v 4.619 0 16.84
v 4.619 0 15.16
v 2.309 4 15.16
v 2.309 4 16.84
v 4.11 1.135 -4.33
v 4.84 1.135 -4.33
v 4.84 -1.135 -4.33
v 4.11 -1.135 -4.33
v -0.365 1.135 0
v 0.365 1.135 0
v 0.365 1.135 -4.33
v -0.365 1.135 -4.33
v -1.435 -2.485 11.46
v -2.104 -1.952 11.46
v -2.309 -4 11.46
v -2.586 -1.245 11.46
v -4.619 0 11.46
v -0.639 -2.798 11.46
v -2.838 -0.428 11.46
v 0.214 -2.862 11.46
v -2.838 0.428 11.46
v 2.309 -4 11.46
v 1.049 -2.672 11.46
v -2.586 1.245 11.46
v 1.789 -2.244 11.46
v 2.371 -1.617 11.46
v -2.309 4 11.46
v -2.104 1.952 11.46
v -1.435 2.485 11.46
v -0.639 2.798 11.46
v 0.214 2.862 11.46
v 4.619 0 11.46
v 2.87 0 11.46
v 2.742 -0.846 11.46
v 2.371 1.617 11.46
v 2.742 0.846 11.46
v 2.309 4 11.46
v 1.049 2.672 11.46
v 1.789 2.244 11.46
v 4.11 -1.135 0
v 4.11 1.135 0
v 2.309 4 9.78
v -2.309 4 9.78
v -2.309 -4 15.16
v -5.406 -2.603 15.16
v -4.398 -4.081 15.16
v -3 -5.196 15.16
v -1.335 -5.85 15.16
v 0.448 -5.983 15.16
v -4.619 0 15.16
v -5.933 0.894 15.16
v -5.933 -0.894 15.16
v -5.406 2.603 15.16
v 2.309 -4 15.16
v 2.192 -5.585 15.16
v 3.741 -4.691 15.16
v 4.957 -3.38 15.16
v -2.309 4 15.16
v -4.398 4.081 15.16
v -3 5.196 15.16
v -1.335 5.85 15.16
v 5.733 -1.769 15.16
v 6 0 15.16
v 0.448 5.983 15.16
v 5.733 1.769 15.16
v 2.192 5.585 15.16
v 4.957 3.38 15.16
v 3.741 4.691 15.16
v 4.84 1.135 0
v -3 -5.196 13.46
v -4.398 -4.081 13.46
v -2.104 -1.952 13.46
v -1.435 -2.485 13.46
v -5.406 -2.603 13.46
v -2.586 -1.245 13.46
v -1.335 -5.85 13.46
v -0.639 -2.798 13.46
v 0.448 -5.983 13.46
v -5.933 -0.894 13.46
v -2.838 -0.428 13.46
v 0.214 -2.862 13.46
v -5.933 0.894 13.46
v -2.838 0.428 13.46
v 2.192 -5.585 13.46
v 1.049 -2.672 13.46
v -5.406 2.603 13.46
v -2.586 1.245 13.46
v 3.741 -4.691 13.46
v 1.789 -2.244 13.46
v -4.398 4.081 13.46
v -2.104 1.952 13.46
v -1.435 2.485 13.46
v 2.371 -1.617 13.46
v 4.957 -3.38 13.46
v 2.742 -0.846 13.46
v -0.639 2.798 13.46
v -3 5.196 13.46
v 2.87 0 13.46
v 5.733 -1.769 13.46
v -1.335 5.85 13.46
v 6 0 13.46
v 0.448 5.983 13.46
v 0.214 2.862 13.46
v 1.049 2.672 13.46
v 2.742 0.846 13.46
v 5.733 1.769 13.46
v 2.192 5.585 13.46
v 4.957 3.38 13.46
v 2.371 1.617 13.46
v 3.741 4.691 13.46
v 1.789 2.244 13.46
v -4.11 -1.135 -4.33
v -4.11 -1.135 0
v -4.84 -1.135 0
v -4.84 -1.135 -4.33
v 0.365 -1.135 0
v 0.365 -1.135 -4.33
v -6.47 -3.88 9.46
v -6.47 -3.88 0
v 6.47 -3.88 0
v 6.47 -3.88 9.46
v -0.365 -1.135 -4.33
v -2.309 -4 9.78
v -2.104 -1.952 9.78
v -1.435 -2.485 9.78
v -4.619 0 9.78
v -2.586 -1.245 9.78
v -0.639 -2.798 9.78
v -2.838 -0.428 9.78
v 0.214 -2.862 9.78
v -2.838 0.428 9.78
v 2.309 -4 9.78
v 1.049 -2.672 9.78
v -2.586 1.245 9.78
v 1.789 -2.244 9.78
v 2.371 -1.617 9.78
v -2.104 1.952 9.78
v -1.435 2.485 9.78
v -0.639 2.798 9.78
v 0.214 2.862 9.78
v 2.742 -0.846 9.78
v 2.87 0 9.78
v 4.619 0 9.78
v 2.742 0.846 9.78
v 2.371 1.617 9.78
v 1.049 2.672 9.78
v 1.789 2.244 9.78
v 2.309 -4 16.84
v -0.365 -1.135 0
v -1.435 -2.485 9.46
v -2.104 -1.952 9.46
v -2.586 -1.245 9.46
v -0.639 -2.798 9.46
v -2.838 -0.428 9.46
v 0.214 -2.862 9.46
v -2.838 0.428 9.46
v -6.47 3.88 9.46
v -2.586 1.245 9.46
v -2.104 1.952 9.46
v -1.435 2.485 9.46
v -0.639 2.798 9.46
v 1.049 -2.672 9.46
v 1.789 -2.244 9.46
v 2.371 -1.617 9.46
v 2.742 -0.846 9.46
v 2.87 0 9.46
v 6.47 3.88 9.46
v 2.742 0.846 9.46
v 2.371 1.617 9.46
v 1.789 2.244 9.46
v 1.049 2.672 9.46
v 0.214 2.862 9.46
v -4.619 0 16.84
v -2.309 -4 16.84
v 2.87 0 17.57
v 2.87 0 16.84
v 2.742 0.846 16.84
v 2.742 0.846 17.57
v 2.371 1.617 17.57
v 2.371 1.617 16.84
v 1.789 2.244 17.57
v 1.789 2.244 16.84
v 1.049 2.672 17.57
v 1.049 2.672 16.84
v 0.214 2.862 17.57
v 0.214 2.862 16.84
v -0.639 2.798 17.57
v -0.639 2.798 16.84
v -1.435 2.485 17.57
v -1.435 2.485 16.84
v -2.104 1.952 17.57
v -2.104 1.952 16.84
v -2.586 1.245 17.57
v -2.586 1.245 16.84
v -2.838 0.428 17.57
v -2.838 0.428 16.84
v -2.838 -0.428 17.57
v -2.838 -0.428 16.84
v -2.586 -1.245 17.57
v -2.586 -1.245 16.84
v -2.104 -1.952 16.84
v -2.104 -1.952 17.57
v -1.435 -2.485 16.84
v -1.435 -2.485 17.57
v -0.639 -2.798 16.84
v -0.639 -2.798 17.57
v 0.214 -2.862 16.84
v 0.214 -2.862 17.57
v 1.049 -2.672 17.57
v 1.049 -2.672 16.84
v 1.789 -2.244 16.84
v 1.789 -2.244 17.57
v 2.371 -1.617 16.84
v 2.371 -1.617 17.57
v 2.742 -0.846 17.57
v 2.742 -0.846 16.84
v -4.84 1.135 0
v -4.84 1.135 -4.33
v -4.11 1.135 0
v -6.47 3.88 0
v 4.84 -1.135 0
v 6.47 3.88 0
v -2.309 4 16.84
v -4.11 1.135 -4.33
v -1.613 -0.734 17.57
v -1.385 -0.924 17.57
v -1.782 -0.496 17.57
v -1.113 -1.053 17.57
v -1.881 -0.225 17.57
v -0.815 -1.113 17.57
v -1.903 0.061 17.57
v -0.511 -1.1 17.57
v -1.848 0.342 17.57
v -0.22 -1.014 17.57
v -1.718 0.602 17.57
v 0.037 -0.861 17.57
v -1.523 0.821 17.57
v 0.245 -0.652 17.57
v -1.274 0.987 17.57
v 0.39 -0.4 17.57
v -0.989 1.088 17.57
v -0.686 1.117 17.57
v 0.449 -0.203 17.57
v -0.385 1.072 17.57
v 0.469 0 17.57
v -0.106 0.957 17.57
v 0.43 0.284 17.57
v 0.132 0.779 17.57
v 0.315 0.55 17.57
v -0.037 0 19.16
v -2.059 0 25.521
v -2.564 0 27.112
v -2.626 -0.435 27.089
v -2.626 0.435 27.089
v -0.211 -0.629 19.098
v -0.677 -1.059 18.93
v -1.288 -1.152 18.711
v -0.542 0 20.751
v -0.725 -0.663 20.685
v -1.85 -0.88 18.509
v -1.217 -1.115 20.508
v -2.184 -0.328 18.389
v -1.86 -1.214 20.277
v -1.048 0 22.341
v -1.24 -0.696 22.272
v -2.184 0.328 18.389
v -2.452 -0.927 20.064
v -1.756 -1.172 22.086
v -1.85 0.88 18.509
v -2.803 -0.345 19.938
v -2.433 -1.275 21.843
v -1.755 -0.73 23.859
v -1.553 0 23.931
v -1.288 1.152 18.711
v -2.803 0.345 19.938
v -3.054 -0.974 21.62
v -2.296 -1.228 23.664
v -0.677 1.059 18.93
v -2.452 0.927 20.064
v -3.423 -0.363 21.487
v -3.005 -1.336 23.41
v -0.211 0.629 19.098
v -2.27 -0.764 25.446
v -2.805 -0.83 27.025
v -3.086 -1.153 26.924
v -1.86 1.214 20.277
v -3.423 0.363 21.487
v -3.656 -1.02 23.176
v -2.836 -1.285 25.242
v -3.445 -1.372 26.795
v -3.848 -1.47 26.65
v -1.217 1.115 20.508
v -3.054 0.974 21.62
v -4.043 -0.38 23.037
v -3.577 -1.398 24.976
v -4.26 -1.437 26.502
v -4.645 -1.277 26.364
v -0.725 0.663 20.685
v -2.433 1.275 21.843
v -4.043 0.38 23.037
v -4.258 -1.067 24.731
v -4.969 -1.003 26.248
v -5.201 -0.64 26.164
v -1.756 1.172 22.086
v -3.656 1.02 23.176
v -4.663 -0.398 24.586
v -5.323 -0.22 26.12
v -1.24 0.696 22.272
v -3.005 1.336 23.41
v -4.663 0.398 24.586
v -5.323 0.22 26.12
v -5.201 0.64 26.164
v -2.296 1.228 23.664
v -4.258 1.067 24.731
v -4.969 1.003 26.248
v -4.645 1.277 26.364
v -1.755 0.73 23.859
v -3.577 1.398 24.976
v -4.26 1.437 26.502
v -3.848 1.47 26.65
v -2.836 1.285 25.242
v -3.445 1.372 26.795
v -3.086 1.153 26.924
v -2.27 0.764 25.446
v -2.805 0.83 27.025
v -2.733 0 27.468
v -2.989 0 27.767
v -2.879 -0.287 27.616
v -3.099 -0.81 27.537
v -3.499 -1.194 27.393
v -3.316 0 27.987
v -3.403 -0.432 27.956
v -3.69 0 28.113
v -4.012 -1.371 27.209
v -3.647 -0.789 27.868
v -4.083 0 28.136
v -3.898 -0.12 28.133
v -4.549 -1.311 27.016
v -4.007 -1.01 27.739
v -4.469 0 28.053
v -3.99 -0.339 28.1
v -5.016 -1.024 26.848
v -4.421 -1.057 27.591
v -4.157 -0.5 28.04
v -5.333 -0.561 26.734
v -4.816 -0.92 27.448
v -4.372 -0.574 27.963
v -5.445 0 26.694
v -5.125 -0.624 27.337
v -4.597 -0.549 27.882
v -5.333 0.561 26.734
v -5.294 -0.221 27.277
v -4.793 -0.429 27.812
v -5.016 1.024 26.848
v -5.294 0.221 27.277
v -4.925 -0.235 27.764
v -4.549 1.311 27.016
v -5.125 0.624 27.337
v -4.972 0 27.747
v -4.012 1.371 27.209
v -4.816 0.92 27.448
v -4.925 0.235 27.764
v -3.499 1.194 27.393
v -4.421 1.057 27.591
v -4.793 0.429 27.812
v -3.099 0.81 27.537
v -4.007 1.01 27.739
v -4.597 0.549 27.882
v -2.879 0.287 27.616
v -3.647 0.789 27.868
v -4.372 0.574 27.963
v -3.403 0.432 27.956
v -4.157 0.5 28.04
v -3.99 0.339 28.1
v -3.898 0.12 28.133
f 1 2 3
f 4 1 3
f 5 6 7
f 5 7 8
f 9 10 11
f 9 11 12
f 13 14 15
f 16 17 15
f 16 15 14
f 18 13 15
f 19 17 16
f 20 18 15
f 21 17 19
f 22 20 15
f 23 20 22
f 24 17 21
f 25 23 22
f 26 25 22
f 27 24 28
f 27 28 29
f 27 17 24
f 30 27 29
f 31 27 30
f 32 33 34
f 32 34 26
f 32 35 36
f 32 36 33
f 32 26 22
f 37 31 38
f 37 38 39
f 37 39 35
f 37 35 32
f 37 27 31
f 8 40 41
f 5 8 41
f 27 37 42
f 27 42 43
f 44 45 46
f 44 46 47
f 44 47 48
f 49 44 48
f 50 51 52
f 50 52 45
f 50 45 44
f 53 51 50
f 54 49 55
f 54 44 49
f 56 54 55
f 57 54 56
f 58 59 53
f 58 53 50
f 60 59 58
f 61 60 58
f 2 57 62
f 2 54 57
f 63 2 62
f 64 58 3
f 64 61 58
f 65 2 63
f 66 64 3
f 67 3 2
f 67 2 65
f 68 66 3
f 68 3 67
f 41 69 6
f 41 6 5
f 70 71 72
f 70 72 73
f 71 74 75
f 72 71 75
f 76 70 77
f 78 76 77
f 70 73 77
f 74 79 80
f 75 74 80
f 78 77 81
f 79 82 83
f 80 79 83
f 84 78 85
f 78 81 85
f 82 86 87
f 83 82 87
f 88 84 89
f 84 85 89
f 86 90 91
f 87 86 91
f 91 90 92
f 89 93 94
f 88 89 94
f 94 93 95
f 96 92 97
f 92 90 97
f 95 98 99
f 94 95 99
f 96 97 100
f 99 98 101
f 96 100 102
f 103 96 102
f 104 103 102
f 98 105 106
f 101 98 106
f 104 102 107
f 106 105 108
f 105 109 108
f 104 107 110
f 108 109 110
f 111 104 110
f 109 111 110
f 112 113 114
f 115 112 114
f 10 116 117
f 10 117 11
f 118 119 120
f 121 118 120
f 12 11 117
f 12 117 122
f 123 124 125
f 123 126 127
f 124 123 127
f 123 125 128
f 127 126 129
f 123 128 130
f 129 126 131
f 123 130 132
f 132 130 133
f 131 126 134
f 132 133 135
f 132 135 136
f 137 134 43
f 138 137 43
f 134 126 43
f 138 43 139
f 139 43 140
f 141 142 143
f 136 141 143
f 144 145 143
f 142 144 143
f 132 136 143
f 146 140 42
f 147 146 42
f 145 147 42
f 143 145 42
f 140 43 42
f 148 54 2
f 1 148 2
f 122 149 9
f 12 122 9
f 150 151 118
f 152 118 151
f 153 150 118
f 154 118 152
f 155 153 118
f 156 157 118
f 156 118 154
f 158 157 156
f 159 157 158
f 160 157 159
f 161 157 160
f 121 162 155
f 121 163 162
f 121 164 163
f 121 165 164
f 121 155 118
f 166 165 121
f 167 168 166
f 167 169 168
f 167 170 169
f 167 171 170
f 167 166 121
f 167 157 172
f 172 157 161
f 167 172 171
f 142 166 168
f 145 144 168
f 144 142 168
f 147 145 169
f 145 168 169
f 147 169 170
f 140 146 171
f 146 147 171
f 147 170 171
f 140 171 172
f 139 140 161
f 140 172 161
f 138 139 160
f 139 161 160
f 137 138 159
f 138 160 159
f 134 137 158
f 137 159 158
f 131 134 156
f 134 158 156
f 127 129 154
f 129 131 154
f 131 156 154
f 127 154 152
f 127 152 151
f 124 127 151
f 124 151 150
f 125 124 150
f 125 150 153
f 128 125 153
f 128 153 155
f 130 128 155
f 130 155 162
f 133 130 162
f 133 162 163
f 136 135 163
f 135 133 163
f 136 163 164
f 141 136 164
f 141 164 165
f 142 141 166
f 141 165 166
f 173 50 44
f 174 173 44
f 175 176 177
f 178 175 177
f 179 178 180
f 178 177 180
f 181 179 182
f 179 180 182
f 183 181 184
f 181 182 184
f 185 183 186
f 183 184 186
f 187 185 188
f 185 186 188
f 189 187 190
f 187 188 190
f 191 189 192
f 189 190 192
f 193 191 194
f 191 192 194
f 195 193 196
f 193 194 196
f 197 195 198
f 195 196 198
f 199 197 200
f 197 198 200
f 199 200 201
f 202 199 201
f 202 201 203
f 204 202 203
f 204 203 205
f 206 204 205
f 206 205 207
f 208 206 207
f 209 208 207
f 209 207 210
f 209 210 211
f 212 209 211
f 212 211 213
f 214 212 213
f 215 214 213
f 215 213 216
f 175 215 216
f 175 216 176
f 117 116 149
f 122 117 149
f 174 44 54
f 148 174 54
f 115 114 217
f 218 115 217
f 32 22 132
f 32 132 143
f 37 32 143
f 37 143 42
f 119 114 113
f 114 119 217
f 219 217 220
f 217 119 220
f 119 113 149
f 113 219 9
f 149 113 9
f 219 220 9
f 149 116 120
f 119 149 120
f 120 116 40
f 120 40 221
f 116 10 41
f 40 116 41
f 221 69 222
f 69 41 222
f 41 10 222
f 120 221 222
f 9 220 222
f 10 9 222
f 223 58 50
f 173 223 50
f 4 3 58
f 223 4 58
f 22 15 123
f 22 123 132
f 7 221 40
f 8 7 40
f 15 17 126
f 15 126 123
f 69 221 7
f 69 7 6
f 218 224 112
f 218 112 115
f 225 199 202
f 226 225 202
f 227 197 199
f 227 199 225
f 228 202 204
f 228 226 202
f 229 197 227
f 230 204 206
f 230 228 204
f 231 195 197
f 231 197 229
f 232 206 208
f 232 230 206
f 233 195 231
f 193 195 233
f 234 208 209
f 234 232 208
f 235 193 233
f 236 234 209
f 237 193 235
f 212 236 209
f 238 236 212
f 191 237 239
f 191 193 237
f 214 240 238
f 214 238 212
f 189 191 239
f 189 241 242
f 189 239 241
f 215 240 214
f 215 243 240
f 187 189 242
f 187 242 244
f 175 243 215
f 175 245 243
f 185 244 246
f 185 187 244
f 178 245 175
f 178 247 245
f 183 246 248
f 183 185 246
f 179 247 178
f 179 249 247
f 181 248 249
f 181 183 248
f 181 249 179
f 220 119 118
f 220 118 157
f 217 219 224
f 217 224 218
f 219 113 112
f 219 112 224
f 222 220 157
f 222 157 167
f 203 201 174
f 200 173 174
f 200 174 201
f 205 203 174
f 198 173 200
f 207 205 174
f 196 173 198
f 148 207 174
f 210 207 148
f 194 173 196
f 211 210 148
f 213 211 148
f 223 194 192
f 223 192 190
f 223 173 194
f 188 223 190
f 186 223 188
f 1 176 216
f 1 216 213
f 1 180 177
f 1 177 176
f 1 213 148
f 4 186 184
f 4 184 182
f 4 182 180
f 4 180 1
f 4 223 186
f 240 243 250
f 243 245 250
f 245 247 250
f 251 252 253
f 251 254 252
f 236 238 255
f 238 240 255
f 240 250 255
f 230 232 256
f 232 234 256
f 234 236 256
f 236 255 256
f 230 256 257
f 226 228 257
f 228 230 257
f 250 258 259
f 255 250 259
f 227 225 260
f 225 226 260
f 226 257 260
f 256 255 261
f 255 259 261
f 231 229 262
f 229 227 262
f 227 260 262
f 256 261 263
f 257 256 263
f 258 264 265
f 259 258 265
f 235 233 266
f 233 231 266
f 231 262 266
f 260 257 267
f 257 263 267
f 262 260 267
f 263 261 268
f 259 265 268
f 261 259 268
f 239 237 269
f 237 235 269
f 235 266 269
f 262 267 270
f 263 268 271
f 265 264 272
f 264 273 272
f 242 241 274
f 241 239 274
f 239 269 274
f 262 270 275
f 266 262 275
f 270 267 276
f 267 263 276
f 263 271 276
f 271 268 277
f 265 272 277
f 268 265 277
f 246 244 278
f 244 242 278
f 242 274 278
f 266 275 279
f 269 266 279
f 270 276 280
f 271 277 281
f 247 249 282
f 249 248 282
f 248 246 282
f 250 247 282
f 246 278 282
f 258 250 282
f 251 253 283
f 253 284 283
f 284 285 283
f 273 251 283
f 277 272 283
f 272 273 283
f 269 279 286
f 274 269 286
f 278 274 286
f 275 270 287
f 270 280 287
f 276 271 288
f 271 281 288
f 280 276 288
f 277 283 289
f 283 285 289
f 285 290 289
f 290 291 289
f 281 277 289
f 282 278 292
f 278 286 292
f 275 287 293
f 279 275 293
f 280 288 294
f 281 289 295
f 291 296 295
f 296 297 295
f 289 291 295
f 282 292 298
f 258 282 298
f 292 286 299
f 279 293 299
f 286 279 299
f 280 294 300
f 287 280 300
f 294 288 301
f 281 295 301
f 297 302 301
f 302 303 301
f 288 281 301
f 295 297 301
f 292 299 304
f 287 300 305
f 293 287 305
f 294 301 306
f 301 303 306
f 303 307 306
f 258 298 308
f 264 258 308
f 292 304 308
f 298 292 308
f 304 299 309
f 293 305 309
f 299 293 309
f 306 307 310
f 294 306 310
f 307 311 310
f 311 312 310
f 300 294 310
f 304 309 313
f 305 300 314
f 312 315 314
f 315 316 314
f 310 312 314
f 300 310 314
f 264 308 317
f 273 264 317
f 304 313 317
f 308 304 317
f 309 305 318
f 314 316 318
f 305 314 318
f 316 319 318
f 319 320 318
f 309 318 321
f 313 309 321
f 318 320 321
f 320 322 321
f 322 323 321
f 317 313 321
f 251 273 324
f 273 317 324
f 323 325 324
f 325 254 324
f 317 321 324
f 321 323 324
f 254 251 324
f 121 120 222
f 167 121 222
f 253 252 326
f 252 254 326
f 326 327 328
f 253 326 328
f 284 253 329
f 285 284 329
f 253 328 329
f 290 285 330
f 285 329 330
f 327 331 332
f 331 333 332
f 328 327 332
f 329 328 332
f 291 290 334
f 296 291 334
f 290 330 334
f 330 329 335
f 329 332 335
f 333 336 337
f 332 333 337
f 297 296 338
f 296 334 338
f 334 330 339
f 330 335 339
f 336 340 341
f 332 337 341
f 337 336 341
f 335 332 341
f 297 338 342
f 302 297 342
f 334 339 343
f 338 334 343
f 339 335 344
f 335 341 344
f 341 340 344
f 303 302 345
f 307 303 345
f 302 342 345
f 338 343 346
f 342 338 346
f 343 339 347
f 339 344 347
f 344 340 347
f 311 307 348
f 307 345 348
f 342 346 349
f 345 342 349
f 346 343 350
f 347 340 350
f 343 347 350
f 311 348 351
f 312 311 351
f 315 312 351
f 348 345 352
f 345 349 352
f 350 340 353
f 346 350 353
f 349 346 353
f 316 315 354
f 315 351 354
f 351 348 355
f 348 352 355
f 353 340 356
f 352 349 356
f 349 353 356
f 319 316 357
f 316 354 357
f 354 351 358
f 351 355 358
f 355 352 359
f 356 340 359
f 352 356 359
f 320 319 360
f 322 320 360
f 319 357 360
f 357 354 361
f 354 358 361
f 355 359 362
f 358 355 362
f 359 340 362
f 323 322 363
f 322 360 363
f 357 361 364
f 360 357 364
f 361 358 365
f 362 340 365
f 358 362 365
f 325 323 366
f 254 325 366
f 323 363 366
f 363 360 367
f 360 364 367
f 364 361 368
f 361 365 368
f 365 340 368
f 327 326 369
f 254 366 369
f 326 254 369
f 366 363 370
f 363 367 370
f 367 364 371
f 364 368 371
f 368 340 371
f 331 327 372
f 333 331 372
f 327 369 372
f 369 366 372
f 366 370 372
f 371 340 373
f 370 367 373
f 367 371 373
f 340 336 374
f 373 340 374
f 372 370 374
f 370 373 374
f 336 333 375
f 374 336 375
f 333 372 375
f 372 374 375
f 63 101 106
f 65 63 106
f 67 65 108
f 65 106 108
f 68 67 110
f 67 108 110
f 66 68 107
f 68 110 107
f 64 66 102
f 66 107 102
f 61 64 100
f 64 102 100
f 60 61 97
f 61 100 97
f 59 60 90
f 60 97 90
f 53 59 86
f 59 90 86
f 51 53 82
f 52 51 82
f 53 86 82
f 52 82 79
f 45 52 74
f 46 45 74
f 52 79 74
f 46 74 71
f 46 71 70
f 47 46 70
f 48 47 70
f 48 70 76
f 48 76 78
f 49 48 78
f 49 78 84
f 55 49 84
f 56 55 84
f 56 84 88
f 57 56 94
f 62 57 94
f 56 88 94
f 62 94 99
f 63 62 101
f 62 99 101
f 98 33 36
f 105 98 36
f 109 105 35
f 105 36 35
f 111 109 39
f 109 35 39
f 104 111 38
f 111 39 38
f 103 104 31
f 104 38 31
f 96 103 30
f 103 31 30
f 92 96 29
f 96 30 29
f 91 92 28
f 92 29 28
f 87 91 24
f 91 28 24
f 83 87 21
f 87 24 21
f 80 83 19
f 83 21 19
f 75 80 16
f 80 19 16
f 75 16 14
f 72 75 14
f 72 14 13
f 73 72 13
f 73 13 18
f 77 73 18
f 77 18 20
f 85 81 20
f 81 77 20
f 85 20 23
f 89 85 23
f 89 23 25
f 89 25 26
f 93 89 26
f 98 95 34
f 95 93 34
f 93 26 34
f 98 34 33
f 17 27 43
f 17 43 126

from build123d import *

# Parameters (mm, degrees)
SKETCH1_W           = 12.94
SKETCH1_H           = 7.76
BOSS_EXTRUDE1_DEPTH = 9.46
SKETCH2_R           = 2.87
BOSS_EXTRUDE2_DEPTH = 8.11
SKETCH4_W           = 0.73
SKETCH4_H           = 2.27
BOSS_EXTRUDE3_DEPTH = 4.33
BOSS_EXTRUDE4_DEPTH = 1.68
SKETCH6_R           = 6
BOSS_EXTRUDE5_DEPTH = 1.7
BOSS_EXTRUDE6_DEPTH = 1.68


with BuildPart() as part:
    # Sketch1 → Boss-Extrude1 (new body)
    with BuildSketch(Plane.XY):
        Rectangle(SKETCH1_W, SKETCH1_H)
    extrude(amount=BOSS_EXTRUDE1_DEPTH)

    # Sketch2 → Boss-Extrude2 (add)
    with BuildSketch(Plane.XY.offset(9.46)):
        Circle(SKETCH2_R)
    extrude(amount=BOSS_EXTRUDE2_DEPTH)

    # Sketch3 → Revolve1 (revolve)
    with BuildSketch(Plane(origin=(0, 0, 0), x_dir=(1, 0, 0), z_dir=(0, 1, 0))):
        with BuildLine():
            Line((0.46866366, -17.57), (-2.564053278, -27.111612822))
            ThreePointArc((-2.564053278, -27.111612822), (-3.316297804, -27.98726181), (-4.468815416, -28.053111116))
            Line((-4.468815416, -28.053111116), (-0.702418437, -17.57))
            Line((-0.702418437, -17.57), (0.46866366, -17.57))
        make_face()
    revolve(axis=Axis((-4.468815416, 0, 28.053111116), (0.3381215193488044, 0, -0.9411024589029912)))

    # Sketch4 → Boss-Extrude3 (add)
    with BuildSketch(Plane(origin=(0, 0, 0), x_dir=(-1, 0, 0), z_dir=(0, 0, -1))):
        Rectangle(SKETCH4_W, SKETCH4_H)
        with Locations((-4.475, 0)):
            Rectangle(SKETCH4_W, SKETCH4_H)
        with Locations((4.475, 0)):
            Rectangle(SKETCH4_W, SKETCH4_H)
    extrude(amount=BOSS_EXTRUDE3_DEPTH)

    # Sketch5 → Boss-Extrude4 (add)
    with BuildSketch(Plane.XY.offset(11.46)):
        Polygon((-2.309401077, -4), (2.309401077, -4), (4.618802154, 0), (2.309401077, 4), (-2.309401077, 4), (-4.618802154, 0), align=None)
    extrude(amount=-BOSS_EXTRUDE4_DEPTH)

    # Sketch6 → Boss-Extrude5 (add)
    with BuildSketch(Plane.XY.offset(13.46)):
        Circle(SKETCH6_R)
    extrude(amount=BOSS_EXTRUDE5_DEPTH)

    # Sketch7 → Boss-Extrude6 (add)
    with BuildSketch(Plane.XY.offset(15.16)):
        Polygon((-2.309401077, -4), (2.309401077, -4), (4.618802154, 0), (2.309401077, 4), (-2.309401077, 4), (-4.618802154, 0), align=None)
    extrude(amount=BOSS_EXTRUDE6_DEPTH)


solid = part.part
